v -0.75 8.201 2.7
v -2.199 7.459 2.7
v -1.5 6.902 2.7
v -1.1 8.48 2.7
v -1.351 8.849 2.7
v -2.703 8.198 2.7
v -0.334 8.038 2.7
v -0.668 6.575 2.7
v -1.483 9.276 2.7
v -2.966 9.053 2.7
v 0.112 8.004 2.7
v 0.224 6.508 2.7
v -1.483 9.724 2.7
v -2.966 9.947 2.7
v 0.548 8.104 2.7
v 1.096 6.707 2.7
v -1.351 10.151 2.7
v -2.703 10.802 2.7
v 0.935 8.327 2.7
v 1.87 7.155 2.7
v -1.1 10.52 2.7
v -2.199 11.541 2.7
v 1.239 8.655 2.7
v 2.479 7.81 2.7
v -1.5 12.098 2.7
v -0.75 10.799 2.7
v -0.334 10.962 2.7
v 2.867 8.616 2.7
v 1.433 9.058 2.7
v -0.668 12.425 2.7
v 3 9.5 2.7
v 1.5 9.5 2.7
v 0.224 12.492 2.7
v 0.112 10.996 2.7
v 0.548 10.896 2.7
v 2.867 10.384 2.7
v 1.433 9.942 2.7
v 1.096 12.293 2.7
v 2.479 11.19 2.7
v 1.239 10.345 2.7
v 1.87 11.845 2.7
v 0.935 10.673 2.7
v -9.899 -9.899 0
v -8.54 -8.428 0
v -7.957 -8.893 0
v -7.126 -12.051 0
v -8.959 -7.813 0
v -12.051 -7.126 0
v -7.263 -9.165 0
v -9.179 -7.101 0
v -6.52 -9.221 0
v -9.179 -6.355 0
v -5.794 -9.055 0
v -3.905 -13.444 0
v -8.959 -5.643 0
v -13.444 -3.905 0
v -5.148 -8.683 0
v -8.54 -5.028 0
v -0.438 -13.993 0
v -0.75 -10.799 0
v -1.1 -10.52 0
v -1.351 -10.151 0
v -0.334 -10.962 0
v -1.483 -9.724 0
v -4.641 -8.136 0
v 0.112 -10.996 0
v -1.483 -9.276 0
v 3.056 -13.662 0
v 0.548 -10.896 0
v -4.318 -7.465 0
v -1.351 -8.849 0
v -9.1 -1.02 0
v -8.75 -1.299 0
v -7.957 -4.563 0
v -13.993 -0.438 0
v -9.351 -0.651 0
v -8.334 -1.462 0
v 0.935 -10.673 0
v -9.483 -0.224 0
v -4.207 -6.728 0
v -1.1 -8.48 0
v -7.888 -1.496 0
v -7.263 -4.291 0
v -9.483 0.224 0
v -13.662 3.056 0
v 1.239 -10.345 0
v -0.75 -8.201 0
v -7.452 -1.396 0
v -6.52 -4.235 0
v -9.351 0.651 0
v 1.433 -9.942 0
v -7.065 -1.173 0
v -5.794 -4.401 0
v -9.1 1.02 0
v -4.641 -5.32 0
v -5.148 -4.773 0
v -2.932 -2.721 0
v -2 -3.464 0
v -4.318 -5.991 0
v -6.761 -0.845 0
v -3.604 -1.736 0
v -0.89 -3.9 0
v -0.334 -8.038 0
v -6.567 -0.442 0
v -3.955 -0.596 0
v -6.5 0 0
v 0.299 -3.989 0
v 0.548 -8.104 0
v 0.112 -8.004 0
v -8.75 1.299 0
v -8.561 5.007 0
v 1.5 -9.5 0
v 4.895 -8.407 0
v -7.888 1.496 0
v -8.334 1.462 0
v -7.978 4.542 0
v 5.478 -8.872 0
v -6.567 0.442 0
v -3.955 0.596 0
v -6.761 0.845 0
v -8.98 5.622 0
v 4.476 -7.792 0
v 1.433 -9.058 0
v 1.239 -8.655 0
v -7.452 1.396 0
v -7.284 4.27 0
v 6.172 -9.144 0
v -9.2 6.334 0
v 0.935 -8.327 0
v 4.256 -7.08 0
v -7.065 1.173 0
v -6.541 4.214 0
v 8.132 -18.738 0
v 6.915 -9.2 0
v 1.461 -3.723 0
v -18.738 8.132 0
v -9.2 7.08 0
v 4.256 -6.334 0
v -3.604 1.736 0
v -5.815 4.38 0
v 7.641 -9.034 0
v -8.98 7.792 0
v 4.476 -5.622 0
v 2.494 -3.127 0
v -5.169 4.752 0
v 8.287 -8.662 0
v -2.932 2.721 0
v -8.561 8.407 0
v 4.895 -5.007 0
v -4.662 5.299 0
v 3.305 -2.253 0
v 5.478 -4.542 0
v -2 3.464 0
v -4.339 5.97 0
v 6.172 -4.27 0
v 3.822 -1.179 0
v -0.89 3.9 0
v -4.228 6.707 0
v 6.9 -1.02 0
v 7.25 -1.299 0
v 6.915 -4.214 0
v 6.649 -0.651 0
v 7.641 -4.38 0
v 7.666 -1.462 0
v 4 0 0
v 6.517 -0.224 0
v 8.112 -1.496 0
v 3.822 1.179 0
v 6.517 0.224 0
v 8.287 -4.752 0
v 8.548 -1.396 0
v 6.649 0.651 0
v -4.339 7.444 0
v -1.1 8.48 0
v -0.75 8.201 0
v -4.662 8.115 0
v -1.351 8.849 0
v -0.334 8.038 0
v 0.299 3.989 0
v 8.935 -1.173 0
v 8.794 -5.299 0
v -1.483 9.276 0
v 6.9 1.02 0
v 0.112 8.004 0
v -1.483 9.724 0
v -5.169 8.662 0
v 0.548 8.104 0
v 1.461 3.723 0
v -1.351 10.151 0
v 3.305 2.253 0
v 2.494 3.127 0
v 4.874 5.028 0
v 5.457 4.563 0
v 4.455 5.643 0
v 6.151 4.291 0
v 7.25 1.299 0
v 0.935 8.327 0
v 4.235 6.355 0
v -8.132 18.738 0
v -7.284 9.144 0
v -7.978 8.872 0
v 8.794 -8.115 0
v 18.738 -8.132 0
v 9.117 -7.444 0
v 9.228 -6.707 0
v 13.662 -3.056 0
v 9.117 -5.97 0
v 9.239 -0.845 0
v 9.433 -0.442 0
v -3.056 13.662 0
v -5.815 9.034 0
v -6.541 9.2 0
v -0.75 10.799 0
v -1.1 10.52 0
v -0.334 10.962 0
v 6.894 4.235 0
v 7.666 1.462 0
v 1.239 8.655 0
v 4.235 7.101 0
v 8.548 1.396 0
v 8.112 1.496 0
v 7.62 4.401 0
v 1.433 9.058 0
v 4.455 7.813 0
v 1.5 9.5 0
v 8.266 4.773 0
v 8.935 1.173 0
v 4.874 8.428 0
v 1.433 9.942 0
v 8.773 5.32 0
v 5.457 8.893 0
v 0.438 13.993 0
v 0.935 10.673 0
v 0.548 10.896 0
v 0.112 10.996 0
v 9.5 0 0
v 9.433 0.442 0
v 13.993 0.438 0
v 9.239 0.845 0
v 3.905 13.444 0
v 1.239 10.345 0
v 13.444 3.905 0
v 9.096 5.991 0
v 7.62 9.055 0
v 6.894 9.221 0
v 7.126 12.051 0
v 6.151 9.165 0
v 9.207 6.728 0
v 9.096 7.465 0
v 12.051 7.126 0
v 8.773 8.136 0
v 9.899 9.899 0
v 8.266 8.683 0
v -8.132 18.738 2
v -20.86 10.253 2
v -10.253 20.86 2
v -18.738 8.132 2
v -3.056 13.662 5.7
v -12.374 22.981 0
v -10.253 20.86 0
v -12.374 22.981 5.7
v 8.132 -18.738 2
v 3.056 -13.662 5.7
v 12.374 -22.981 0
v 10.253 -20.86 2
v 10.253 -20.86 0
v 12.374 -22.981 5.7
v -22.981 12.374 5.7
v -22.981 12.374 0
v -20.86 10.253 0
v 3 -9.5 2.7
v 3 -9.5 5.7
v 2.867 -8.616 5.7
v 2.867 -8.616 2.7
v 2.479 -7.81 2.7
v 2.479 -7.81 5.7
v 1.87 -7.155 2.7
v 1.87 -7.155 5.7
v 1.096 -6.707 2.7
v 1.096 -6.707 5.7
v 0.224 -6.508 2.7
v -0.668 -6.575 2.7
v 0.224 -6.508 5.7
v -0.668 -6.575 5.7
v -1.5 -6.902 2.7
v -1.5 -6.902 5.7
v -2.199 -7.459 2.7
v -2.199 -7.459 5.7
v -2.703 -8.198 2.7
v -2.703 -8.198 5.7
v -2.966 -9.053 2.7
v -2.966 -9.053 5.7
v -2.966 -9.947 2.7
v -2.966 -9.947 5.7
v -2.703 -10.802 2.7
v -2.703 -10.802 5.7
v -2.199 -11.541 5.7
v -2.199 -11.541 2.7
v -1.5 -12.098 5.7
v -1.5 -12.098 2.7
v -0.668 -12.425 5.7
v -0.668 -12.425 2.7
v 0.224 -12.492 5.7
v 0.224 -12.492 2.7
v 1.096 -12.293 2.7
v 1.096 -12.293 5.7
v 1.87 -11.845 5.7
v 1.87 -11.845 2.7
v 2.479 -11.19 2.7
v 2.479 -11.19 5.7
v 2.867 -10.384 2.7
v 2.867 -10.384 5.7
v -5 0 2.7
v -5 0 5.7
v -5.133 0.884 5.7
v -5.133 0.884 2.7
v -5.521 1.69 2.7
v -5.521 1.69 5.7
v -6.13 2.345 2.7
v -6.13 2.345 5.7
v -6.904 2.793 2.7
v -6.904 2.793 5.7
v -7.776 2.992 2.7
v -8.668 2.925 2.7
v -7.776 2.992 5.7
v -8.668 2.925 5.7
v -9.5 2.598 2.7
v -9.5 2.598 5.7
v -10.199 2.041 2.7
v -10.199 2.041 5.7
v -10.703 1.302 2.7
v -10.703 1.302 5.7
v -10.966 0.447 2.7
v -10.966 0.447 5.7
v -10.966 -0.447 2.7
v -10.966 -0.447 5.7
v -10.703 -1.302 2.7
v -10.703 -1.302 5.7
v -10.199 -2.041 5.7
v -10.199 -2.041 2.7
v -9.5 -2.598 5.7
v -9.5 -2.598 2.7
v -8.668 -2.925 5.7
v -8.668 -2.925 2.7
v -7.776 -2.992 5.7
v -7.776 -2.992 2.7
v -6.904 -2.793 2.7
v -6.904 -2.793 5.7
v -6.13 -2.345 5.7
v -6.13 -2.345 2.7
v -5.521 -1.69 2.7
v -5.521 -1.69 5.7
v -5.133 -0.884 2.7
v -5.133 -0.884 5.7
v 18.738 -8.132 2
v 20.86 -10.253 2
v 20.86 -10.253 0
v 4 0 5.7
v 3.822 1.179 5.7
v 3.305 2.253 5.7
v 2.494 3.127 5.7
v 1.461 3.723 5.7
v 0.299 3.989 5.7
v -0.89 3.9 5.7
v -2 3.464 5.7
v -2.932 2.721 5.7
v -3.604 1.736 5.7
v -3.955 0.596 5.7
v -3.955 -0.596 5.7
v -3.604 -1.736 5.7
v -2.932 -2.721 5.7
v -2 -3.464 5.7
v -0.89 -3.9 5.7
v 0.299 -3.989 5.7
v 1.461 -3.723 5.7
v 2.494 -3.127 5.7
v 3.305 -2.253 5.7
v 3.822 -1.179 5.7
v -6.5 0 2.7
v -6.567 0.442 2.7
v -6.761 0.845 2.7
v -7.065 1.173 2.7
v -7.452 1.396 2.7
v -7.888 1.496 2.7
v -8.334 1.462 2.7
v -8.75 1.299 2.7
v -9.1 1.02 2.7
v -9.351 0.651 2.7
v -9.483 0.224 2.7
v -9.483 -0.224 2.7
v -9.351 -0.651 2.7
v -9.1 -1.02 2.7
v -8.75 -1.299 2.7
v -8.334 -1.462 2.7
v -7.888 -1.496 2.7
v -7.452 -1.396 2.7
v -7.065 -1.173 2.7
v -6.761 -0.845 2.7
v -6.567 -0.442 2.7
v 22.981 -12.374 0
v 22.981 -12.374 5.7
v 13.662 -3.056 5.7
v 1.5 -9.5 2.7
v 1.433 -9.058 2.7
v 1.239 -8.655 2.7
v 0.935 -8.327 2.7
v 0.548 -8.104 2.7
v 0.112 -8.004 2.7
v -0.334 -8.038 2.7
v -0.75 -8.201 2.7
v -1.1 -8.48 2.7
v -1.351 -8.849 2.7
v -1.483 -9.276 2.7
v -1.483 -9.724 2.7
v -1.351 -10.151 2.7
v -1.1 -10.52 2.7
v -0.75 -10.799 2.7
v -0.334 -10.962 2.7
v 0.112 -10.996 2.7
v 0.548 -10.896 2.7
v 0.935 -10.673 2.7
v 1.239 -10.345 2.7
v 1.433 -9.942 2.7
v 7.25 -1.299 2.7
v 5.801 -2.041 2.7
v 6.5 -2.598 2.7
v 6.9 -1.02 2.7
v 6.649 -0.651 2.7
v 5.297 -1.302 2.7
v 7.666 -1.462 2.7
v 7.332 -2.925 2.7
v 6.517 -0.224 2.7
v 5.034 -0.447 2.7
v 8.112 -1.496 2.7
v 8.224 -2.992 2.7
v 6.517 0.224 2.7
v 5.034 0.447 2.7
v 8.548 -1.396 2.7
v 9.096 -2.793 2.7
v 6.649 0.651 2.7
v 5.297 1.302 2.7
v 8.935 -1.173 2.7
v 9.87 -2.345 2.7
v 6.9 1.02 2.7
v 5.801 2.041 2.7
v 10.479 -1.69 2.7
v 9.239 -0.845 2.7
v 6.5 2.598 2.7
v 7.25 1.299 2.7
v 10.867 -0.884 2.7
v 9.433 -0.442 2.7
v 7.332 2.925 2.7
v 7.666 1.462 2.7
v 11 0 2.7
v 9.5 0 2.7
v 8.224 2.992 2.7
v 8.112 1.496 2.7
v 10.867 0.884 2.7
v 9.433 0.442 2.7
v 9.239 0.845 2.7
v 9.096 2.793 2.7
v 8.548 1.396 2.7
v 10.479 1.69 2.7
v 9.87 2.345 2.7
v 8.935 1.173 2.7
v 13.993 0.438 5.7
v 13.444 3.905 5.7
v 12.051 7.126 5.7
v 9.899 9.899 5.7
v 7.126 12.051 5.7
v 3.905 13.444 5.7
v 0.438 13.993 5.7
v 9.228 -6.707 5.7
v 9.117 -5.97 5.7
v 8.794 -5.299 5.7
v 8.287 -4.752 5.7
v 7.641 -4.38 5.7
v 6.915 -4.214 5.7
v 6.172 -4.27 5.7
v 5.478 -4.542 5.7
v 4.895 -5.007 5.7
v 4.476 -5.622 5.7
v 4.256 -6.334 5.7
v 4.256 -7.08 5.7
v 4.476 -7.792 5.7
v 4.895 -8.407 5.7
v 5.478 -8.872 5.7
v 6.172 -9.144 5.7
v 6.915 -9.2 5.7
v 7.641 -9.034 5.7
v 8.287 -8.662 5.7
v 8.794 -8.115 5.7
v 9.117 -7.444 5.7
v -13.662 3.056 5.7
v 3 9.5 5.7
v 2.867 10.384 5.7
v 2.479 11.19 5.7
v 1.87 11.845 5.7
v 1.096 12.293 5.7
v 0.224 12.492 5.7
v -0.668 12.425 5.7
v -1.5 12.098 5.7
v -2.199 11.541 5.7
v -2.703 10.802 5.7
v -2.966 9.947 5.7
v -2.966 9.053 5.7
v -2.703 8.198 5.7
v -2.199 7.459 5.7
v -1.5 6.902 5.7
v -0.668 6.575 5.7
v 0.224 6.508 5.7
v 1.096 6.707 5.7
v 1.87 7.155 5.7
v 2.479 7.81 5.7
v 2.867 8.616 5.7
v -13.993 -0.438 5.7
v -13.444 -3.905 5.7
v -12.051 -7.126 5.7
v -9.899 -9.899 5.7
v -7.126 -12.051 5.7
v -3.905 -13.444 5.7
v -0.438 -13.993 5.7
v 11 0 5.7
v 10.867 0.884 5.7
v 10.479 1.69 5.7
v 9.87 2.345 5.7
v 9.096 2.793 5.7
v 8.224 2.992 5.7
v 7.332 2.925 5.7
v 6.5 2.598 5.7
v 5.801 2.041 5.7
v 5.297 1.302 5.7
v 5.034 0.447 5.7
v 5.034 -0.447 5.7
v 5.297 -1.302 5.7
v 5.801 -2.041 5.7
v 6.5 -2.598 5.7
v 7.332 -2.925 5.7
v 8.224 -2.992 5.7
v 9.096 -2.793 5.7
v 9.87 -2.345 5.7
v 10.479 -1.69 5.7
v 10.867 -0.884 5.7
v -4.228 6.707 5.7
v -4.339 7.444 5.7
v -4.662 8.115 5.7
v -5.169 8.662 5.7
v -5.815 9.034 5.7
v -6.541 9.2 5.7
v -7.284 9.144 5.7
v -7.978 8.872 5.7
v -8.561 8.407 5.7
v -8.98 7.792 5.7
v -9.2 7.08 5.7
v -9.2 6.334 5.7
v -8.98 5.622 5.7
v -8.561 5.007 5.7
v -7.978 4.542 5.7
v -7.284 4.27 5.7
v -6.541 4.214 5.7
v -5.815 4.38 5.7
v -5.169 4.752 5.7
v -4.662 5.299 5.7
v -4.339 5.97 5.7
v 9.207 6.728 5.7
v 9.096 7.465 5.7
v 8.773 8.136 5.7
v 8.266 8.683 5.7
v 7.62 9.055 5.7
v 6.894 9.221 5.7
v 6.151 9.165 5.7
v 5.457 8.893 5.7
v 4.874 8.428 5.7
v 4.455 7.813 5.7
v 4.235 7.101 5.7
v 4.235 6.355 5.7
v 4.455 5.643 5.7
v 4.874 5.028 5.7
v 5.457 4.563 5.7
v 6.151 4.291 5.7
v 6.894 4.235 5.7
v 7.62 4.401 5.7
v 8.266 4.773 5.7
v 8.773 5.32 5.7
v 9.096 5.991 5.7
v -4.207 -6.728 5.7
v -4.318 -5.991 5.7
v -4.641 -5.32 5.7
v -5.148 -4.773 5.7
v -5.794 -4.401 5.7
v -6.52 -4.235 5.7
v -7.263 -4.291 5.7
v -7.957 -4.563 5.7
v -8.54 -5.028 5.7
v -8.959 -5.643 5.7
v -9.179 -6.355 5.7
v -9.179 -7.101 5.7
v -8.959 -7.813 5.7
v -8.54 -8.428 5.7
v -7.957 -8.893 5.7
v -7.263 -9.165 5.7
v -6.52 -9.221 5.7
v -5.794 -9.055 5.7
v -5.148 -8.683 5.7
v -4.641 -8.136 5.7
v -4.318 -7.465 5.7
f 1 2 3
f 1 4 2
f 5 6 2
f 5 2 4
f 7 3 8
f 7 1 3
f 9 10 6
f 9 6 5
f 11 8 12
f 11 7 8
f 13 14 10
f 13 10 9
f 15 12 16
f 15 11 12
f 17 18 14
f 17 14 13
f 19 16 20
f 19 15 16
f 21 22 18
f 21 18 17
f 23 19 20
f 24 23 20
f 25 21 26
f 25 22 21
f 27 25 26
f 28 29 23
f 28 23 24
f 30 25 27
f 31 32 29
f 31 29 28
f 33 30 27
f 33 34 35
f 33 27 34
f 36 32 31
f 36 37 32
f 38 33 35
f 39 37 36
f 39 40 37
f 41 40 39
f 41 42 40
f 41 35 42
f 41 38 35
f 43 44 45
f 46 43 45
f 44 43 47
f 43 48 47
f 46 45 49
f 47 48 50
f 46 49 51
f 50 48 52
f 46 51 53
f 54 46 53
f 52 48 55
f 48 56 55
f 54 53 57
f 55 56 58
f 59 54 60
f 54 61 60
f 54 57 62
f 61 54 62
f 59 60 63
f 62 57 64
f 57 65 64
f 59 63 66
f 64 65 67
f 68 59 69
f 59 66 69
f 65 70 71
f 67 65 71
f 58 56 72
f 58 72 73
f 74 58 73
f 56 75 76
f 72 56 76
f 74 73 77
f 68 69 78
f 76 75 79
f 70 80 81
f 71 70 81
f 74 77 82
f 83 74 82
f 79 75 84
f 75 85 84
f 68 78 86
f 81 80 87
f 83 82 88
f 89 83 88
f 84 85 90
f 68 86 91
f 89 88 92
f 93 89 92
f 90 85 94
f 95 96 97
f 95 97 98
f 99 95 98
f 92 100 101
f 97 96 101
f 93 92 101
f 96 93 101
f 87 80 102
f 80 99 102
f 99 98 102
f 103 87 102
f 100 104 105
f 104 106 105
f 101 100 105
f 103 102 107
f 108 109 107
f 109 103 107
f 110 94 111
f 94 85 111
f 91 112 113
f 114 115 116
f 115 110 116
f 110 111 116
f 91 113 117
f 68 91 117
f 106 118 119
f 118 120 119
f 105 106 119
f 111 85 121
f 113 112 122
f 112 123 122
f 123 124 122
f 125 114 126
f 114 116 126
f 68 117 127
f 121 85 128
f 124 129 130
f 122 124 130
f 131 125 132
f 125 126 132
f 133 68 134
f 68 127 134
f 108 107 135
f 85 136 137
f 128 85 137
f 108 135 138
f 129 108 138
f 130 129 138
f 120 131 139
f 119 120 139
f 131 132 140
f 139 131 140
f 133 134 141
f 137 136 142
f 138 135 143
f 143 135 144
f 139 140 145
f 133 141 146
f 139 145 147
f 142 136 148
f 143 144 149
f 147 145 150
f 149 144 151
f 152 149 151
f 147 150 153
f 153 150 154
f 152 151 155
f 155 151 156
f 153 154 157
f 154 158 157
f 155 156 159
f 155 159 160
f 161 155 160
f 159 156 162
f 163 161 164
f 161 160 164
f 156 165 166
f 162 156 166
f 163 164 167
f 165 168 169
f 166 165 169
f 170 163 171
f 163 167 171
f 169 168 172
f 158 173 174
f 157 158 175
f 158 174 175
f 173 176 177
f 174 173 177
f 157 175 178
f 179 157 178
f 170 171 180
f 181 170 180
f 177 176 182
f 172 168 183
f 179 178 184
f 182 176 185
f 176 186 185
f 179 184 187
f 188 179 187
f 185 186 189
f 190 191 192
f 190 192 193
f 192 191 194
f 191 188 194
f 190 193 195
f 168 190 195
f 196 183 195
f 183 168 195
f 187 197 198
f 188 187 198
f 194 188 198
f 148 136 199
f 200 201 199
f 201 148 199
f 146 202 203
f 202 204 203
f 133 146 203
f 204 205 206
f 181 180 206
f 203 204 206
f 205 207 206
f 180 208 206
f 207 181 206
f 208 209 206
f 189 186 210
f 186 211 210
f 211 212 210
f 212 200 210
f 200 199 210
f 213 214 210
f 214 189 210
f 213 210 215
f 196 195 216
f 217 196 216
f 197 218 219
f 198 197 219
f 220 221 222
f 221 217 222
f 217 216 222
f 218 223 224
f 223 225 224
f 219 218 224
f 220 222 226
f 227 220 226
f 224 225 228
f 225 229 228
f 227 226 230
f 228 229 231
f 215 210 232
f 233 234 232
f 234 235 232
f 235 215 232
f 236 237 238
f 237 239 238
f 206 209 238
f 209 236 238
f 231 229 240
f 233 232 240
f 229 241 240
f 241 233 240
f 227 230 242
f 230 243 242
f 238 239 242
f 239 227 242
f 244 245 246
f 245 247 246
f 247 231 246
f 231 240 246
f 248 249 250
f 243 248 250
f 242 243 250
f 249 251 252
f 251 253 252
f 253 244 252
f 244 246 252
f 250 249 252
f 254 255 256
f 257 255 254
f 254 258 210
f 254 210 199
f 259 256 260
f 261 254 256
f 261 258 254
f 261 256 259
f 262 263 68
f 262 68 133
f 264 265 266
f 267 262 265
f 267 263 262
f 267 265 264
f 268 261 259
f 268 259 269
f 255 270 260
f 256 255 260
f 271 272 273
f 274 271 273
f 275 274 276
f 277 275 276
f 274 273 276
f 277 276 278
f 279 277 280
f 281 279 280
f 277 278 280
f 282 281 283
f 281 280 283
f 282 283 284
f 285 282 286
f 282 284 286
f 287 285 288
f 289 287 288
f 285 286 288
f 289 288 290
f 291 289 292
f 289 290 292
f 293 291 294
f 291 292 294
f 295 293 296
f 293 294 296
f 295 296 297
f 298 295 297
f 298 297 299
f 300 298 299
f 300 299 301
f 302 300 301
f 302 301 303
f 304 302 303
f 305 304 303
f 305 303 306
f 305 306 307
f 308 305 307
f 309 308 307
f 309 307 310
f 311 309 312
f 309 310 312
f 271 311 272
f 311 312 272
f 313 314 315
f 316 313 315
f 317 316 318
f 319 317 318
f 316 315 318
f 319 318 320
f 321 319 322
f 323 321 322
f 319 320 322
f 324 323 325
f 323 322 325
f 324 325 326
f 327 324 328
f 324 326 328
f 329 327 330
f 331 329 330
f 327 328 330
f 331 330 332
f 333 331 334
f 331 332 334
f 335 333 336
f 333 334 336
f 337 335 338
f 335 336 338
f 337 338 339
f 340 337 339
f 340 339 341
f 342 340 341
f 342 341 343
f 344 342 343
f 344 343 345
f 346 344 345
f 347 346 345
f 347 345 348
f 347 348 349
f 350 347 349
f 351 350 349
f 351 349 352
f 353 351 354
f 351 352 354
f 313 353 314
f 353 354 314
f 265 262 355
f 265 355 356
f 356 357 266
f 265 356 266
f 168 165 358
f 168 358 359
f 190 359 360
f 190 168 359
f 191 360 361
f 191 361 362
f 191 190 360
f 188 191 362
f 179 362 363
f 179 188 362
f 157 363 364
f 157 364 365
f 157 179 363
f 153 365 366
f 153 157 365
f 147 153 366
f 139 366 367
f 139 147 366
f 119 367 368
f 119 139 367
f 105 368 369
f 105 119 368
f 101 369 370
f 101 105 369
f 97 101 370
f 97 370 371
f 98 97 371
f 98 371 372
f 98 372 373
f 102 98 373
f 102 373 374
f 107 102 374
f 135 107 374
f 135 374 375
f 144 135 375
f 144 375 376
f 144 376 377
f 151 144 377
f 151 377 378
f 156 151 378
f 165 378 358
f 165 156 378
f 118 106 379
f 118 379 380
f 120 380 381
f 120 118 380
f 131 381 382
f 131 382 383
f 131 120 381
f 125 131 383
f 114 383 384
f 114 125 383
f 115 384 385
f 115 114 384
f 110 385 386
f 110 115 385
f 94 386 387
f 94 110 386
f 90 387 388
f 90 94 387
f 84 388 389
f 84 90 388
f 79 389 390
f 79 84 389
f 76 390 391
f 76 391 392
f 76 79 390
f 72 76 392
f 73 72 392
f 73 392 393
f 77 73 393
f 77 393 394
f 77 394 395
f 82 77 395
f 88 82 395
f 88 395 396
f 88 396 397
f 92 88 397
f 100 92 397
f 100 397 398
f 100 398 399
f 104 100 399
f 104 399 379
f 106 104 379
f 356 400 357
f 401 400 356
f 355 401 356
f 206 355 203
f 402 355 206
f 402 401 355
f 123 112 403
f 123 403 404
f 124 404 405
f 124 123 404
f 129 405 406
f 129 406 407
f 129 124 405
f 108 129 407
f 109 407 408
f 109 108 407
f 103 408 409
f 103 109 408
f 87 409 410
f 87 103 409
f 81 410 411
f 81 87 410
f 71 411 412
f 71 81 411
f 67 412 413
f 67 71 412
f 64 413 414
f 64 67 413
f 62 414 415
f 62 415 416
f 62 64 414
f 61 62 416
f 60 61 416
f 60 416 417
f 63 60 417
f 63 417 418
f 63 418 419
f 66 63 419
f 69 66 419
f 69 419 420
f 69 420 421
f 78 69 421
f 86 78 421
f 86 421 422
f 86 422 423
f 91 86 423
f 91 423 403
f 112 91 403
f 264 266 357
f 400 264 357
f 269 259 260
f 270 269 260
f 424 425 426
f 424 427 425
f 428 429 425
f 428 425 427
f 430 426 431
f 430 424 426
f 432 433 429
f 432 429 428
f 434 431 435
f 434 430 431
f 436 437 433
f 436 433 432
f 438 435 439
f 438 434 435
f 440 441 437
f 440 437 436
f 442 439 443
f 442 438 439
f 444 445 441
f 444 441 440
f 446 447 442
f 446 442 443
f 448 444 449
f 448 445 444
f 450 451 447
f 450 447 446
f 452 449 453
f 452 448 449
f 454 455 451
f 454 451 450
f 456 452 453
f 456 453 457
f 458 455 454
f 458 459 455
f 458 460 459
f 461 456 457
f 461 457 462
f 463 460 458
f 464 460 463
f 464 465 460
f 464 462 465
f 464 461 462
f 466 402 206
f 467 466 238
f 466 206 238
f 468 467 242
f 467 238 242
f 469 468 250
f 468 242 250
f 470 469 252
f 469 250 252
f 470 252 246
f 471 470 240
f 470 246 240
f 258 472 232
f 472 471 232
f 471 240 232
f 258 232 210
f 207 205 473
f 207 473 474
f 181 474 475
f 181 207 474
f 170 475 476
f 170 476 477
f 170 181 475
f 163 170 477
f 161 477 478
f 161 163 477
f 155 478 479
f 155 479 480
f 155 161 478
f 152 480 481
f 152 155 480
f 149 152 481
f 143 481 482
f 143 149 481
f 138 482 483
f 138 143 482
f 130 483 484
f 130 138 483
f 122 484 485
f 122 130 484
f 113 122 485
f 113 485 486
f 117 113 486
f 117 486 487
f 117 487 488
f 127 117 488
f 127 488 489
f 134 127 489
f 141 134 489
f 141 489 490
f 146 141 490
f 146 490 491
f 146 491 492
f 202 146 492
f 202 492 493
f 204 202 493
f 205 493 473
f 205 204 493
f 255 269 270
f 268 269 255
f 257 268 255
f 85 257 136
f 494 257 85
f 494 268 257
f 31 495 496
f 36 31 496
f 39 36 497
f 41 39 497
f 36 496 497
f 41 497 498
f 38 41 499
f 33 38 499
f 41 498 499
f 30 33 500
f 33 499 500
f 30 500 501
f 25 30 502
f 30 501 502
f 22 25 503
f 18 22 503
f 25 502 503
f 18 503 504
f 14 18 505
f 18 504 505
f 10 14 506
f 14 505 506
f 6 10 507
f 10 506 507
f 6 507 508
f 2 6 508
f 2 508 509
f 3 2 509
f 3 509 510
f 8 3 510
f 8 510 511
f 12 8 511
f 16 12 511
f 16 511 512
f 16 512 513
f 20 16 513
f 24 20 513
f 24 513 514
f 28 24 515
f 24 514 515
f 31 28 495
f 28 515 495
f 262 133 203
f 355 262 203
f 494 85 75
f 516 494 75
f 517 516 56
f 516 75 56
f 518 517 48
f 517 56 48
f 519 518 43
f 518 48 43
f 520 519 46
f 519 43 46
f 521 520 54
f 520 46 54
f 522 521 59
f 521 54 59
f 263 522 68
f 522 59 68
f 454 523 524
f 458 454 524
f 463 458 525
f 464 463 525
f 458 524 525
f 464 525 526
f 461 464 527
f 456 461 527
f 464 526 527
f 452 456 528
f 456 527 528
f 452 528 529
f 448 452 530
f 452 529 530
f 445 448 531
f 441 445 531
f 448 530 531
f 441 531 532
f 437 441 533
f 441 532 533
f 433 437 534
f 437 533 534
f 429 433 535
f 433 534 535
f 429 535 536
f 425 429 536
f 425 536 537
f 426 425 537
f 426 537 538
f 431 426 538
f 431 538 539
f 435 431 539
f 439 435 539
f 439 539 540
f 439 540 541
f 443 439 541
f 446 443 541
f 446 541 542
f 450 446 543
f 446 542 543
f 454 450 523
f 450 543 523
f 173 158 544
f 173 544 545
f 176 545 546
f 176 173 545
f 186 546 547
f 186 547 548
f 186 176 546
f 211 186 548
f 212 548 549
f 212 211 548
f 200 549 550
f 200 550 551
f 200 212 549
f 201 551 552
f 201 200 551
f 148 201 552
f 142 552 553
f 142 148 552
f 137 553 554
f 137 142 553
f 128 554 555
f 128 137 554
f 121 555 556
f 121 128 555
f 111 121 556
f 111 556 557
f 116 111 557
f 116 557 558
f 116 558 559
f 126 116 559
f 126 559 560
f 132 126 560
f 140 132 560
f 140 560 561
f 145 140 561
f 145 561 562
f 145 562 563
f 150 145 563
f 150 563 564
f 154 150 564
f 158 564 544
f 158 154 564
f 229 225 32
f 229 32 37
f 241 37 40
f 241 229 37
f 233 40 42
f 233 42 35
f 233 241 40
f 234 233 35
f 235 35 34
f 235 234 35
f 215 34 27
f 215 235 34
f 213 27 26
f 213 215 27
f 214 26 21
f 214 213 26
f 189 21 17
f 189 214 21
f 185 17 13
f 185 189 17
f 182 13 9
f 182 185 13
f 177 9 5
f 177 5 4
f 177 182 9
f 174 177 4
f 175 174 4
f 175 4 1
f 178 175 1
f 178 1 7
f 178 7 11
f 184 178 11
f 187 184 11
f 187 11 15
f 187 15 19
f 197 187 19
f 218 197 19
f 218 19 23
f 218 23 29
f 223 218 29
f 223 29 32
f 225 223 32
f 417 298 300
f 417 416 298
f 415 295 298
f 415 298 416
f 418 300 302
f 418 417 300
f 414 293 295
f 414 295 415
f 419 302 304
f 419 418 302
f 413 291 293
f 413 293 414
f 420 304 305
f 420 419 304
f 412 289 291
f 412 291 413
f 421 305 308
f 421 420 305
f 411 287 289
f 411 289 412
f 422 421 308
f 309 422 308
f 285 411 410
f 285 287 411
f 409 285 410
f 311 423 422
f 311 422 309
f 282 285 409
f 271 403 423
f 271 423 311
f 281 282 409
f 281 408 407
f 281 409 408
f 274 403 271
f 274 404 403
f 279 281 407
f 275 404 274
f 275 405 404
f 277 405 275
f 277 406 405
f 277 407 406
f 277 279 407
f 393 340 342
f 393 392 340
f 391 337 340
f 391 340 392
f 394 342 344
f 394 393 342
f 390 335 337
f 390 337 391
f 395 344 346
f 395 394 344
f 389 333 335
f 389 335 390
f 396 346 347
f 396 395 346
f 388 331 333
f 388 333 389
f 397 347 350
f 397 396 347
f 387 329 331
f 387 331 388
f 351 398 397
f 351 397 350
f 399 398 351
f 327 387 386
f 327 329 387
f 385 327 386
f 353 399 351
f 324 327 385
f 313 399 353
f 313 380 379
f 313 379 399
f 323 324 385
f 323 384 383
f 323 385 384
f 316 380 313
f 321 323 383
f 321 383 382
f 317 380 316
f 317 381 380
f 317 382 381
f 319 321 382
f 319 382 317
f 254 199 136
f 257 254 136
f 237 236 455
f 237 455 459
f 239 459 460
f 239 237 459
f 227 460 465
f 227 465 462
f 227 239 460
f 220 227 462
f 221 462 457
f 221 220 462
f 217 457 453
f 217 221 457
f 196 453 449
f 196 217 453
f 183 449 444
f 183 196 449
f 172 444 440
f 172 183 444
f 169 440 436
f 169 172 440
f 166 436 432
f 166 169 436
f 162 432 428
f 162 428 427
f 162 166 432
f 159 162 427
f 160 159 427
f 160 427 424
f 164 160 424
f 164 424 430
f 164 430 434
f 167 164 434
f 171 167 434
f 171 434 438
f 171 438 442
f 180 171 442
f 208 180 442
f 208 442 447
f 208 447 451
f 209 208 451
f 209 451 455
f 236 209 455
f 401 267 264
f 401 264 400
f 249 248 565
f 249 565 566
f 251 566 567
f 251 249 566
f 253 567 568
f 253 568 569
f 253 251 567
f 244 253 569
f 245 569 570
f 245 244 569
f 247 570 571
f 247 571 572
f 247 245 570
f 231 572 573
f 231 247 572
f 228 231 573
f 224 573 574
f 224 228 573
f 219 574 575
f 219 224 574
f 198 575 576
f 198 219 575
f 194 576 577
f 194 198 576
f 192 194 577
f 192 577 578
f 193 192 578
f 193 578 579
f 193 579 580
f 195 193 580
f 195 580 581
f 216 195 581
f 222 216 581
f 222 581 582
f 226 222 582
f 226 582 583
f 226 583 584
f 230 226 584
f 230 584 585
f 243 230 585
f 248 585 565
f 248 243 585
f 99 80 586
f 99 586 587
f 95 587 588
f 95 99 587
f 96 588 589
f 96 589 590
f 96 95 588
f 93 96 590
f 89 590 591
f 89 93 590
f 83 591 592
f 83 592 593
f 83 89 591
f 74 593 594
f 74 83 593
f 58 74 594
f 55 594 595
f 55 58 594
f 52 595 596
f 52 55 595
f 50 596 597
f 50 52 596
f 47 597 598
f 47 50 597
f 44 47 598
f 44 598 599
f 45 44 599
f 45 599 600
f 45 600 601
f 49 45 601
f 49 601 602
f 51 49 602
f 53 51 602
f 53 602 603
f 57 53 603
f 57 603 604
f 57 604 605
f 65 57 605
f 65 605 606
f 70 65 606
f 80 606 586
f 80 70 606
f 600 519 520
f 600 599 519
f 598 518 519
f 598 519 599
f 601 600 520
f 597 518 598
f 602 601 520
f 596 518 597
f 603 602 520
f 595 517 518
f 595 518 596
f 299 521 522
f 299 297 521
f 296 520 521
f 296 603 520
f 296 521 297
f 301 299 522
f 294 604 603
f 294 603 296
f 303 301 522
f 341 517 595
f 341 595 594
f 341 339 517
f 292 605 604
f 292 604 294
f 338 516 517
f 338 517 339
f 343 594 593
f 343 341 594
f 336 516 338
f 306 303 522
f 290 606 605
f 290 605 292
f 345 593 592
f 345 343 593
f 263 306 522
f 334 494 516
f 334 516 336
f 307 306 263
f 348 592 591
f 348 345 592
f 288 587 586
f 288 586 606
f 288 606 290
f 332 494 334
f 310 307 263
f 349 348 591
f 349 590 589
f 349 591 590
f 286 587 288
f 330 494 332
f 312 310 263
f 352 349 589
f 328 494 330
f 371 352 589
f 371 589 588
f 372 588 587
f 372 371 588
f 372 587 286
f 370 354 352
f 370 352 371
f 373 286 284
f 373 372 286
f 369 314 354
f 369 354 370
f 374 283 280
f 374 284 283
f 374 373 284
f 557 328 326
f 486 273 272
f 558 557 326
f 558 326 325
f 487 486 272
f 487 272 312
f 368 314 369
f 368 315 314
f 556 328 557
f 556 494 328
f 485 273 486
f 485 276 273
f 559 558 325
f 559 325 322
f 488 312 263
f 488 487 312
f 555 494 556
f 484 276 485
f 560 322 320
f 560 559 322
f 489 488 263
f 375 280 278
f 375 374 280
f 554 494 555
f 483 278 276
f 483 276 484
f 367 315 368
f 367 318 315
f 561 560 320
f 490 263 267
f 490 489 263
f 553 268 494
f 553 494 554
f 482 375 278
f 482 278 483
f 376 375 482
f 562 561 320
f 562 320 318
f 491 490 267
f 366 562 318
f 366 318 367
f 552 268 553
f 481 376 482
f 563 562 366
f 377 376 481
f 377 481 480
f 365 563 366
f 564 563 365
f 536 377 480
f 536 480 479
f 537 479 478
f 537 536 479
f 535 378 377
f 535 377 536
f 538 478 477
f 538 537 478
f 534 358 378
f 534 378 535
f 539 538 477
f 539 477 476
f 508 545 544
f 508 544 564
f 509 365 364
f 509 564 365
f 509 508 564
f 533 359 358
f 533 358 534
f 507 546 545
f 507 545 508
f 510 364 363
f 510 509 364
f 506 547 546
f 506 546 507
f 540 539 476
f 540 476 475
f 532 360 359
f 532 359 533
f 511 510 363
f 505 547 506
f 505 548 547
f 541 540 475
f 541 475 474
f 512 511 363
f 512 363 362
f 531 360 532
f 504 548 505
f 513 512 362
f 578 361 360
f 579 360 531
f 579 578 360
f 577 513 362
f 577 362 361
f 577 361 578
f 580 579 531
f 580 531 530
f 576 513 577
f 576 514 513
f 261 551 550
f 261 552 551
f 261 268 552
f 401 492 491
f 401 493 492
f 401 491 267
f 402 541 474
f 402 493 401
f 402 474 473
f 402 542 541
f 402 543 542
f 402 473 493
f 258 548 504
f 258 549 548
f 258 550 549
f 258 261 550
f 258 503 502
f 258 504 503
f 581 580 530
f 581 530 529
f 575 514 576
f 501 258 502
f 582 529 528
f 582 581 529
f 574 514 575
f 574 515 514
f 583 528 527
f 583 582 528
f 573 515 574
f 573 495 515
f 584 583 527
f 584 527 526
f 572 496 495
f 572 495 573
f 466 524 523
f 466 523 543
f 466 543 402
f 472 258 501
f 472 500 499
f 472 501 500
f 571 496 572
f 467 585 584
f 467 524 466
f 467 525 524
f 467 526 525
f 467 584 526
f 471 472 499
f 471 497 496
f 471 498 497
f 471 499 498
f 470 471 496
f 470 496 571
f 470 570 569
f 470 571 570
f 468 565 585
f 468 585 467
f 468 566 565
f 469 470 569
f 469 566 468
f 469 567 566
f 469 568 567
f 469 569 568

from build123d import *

# Parameters (mm, degrees)
F0_R     = 14
F0_R_2   = 2.5
F0_R_3   = 1.5
F0_R_4   = 4
F1_DEPTH = 5.7
F2_R     = 3
F2_R_2   = 1.5
F3_DEPTH = 3
F5_DEPTH = 5.7
F7_DEPTH = 2


with BuildPart() as f1:
    # F0 (on Top) → F1 (new body)
    with BuildSketch(Plane.XY):
        Circle(F0_R)
        with Locations((-6.707044, -6.727968)):
            Circle(F0_R_2, mode=Mode.SUBTRACT)
        with Locations((0, -9.5)):
            Circle(F0_R_3, mode=Mode.SUBTRACT)
        with Locations((6.727968, -6.707044)):
            Circle(F0_R_2, mode=Mode.SUBTRACT)
        with Locations((-8, 0)):
            Circle(F0_R_3, mode=Mode.SUBTRACT)
        with Locations((-6.727968, 6.707044)):
            Circle(F0_R_2, mode=Mode.SUBTRACT)
        Circle(F0_R_4, mode=Mode.SUBTRACT)
        with Locations((6.707044, 6.727968)):
            Circle(F0_R_2, mode=Mode.SUBTRACT)
        with Locations((8, 0)):
            Circle(F0_R_3, mode=Mode.SUBTRACT)
        with Locations((0, 9.5)):
            Circle(F0_R_3, mode=Mode.SUBTRACT)
    extrude(amount=F1_DEPTH)

    # F2 (on face) → F3 (cut)
    with BuildSketch(Plane.XY.offset(5.7)):
        with Locations((0, 9.5)):
            Circle(F2_R)
        with Locations((0, 9.5)):
            Circle(F2_R_2, mode=Mode.SUBTRACT)
        with Locations((-8, 0)):
            Circle(F2_R)
        with Locations((-8, 0)):
            Circle(F2_R_2, mode=Mode.SUBTRACT)
        with Locations((0, -9.5)):
            Circle(F2_R)
        with Locations((0, -9.5)):
            Circle(F2_R_2, mode=Mode.SUBTRACT)
        with Locations((8, 0)):
            Circle(F2_R)
        with Locations((8, 0)):
            Circle(F2_R_2, mode=Mode.SUBTRACT)
    extrude(amount=-F3_DEPTH, mode=Mode.SUBTRACT)

    # F4 (on face) → F5 (join)
    with BuildSketch(Plane.XY.offset(5.7)):
        with BuildLine():
            Line((-22.98097, 12.374369), (-13.662428, 3.055826))
            ThreePointArc((-13.662428, 3.055826), (-9.899495, 9.899495), (-3.055826, 13.662428))
            Line((-3.055826, 13.662428), (-12.374369, 22.98097))
            Line((-12.374369, 22.98097), (-22.98097, 12.374369))
        make_face()
        with BuildLine():
            Line((12.374369, -22.98097), (22.98097, -12.374369))
            Line((22.98097, -12.374369), (13.662428, -3.055826))
            ThreePointArc((13.662428, -3.055826), (9.899495, -9.899495), (3.055826, -13.662428))
            Line((3.055826, -13.662428), (12.374369, -22.98097))
        make_face()
    extrude(amount=-F5_DEPTH)

    # F6 (on face) → F7 (cut)
    with BuildSketch(Plane(origin=(0, 0, 0), x_dir=(1, 0, 0), z_dir=(0, 0, -1))):
        Polygon((-8.131728, -18.73833), (-18.73833, -8.131728), (-20.85965, -10.253048), (-10.253048, -20.85965), align=None)
        Polygon((20.85965, 10.253048), (10.253048, 20.85965), (8.131728, 18.73833), (18.73833, 8.131728), align=None)
    extrude(amount=-F7_DEPTH, mode=Mode.SUBTRACT)


solid = f1.part
